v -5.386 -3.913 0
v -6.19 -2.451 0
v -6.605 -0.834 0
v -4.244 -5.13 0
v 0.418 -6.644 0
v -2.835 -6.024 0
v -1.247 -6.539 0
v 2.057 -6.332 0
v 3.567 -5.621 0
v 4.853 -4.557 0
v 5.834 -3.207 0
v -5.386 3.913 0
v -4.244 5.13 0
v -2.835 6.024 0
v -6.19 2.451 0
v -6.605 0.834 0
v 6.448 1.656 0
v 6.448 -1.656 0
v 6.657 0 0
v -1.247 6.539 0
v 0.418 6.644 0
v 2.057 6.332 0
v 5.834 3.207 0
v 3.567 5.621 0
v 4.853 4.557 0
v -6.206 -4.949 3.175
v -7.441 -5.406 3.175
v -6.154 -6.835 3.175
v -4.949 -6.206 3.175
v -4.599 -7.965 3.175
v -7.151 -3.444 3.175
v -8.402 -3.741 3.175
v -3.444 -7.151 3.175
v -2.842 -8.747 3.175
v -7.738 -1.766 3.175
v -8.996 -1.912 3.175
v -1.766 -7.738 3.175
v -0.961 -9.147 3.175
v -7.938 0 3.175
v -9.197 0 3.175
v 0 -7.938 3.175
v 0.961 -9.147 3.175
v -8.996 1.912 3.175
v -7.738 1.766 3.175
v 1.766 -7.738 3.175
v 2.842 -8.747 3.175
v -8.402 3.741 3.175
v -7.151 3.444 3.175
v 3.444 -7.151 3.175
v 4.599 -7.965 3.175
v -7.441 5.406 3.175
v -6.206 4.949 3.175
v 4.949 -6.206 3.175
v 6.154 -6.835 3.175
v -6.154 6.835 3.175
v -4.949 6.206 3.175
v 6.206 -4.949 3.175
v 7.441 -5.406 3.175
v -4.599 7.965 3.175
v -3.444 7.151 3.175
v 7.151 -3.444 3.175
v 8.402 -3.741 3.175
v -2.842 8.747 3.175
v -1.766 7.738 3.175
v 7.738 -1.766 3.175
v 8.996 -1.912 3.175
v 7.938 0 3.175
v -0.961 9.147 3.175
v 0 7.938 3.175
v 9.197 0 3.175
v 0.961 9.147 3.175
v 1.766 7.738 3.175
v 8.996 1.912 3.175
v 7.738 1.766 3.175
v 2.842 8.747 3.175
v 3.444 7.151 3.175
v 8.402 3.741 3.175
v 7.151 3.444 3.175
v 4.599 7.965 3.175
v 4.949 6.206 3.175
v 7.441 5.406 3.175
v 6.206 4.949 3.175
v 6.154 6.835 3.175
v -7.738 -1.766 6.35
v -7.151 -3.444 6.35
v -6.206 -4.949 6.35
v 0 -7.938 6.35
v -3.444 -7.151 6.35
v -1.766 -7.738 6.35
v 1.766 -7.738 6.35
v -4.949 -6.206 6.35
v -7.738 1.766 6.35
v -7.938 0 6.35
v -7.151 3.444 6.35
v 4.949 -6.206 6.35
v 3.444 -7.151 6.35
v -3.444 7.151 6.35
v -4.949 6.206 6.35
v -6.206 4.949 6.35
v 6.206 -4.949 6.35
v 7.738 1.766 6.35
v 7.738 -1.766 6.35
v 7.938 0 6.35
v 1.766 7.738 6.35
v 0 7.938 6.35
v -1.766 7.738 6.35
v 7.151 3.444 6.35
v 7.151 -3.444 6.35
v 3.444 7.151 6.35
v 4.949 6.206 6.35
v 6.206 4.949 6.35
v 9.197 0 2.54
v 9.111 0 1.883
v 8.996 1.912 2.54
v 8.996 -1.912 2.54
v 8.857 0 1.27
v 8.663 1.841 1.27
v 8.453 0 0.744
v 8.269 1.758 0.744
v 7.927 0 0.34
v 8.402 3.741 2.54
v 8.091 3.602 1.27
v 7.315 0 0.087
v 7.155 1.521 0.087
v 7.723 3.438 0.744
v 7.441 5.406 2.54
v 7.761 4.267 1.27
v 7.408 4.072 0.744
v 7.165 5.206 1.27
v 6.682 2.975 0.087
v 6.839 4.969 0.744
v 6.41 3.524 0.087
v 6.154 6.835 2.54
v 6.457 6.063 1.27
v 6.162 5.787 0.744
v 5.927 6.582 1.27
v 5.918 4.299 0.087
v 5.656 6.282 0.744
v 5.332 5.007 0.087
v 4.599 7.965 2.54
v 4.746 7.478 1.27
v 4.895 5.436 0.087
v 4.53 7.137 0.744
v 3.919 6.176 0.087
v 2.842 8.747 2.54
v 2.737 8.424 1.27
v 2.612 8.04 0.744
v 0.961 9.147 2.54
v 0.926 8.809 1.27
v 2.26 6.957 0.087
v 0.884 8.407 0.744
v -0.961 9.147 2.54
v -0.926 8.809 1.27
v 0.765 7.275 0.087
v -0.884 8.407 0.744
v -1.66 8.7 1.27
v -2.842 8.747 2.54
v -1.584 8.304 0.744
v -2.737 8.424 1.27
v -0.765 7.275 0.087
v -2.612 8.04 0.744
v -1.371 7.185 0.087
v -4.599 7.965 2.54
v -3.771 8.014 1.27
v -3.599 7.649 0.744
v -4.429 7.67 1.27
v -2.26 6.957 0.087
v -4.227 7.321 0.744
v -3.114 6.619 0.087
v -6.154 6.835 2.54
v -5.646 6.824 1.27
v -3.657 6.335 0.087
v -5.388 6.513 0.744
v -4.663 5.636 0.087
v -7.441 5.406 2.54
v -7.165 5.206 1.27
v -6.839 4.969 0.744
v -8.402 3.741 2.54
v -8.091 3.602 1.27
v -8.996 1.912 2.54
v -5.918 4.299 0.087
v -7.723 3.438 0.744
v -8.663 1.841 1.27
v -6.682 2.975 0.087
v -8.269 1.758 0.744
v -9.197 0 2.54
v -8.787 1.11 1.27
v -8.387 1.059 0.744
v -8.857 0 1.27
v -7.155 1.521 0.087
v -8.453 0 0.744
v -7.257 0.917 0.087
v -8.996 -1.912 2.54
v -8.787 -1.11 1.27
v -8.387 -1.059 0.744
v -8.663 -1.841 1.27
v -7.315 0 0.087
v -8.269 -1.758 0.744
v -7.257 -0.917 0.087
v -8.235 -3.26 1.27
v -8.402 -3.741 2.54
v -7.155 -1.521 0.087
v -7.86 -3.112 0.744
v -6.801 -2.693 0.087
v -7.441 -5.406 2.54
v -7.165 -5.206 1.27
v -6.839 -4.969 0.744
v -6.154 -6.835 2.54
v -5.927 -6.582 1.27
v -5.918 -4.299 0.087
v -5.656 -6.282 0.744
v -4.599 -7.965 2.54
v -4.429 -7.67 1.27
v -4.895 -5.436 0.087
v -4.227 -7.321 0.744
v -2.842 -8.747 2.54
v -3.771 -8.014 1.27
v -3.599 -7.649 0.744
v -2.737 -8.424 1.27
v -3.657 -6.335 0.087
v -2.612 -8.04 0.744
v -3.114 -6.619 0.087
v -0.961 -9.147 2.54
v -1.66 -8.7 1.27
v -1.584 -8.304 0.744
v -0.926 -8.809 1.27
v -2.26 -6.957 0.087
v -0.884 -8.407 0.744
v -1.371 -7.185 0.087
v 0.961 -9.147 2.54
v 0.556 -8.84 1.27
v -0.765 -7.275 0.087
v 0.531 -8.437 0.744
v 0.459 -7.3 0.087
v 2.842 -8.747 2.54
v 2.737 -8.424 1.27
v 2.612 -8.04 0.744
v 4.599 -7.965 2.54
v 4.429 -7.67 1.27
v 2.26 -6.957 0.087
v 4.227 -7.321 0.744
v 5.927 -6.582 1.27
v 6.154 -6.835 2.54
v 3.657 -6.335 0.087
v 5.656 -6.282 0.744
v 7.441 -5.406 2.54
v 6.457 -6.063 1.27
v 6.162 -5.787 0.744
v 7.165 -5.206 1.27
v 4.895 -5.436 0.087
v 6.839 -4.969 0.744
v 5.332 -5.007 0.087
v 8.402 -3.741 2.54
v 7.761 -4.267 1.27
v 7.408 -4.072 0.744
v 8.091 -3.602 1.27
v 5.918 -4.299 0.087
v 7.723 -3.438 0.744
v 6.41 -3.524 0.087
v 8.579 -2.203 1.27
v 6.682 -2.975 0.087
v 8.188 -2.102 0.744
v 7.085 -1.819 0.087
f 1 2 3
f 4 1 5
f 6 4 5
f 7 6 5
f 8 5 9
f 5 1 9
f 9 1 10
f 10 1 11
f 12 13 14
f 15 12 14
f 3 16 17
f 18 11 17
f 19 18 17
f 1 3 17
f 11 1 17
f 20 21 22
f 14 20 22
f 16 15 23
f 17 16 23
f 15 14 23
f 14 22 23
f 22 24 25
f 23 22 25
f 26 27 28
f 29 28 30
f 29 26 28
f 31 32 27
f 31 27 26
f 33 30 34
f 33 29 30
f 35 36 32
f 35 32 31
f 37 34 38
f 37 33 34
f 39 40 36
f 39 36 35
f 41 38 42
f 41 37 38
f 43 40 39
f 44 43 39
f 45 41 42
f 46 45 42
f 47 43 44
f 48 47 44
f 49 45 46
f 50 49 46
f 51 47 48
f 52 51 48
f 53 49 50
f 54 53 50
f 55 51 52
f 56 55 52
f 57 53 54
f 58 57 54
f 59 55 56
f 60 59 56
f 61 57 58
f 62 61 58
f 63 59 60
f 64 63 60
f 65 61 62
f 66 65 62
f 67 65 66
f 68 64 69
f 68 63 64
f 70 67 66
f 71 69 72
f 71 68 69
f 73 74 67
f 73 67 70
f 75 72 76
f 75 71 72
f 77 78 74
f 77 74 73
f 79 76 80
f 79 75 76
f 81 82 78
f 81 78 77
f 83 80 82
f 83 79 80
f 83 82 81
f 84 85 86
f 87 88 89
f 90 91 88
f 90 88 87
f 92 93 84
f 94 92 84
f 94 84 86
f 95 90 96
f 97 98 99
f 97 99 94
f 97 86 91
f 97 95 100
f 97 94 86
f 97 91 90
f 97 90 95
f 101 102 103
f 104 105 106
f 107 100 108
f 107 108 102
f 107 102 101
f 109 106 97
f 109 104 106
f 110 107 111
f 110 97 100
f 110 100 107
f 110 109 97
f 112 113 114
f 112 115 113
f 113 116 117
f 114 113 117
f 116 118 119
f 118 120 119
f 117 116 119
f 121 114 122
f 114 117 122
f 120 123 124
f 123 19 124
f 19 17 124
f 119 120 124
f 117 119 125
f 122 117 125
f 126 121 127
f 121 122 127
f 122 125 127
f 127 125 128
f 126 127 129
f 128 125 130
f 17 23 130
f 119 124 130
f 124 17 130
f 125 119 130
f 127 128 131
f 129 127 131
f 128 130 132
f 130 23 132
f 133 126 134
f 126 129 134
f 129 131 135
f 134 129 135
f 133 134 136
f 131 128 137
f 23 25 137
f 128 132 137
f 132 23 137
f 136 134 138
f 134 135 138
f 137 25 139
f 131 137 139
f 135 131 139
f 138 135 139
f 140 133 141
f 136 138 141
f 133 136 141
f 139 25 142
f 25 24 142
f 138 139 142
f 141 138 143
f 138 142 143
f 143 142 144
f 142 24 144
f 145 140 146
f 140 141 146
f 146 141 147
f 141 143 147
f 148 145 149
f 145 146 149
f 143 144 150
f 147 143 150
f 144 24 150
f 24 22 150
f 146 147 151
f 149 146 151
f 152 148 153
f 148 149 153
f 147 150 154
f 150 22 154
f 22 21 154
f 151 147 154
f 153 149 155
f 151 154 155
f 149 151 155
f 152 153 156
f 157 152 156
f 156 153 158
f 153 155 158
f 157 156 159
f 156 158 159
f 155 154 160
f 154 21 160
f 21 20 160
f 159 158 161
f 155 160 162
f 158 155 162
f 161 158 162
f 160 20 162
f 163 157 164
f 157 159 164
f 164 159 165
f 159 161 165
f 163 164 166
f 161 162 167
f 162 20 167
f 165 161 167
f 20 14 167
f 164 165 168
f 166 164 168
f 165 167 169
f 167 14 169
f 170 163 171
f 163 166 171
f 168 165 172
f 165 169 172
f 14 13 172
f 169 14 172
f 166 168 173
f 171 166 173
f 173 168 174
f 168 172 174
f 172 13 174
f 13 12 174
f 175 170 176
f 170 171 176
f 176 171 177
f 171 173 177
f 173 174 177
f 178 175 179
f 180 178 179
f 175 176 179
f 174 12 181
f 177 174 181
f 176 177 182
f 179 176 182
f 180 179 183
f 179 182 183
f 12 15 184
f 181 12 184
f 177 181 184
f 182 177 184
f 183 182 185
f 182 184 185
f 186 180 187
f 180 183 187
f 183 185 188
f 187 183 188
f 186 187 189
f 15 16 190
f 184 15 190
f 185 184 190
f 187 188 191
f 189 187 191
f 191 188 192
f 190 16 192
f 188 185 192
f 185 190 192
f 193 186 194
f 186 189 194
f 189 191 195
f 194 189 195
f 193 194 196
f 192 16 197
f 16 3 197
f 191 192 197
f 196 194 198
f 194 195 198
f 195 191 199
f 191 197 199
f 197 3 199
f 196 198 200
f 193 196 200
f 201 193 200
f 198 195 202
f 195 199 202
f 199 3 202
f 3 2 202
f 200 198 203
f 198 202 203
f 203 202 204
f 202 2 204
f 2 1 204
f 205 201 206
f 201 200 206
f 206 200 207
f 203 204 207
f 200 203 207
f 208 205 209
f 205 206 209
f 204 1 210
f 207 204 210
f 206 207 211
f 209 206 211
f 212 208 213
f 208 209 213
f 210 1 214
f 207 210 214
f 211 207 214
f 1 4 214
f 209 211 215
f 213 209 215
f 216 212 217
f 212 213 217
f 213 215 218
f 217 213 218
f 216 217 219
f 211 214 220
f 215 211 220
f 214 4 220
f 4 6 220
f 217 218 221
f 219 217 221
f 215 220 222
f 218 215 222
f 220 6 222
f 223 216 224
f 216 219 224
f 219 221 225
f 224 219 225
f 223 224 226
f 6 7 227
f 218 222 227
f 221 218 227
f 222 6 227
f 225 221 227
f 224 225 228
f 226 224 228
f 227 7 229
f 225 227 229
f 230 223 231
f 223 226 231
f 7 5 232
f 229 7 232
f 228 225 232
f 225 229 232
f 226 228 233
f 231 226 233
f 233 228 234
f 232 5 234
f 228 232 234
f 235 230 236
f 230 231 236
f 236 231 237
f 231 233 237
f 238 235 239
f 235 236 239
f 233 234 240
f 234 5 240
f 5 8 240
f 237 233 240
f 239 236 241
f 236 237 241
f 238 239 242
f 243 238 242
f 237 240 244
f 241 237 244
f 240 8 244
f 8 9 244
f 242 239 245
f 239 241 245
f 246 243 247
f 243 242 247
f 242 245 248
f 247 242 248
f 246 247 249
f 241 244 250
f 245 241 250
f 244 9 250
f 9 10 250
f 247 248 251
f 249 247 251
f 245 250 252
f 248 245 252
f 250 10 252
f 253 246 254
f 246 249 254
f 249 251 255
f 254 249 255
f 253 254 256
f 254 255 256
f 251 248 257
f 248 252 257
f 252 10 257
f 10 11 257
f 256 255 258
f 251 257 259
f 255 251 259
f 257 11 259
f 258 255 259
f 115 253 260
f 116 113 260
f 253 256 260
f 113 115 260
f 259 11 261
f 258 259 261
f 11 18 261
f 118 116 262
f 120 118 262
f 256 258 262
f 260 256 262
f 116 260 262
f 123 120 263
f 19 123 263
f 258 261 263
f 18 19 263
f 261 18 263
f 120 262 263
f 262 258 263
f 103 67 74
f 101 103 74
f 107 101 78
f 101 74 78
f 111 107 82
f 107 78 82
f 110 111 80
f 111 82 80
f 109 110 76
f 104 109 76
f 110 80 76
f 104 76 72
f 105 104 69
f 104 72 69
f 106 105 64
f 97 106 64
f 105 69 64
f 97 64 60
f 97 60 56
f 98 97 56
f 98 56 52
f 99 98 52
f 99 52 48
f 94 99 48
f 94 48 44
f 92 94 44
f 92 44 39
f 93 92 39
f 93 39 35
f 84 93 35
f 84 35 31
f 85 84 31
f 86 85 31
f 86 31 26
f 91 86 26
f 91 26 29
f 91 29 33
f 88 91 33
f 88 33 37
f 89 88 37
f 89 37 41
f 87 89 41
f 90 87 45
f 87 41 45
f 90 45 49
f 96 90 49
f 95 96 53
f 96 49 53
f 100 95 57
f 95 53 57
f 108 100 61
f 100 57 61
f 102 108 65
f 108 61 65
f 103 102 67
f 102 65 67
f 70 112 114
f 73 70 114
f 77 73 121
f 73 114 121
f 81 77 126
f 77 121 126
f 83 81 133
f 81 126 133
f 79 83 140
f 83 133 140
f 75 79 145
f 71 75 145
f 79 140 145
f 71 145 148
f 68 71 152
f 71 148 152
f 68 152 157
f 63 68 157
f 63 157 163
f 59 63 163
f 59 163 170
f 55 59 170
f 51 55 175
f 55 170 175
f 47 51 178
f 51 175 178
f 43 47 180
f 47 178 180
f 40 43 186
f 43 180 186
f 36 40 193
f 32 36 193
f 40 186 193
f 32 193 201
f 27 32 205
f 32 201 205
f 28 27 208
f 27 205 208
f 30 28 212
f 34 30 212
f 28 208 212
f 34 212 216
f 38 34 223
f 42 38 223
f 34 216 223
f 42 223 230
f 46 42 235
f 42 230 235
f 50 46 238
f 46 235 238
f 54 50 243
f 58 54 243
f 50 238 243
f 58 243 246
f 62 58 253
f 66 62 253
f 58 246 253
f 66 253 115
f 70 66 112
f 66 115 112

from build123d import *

# Parameters (mm, degrees)
F0_R     = 7.9375
F1_DEPTH = 6.35
F0_R_2   = 9.19734
F2_DEPTH = 3.175
F3_R     = 2.54


with BuildPart() as f1:
    # F0 (on Top) → F1 (new body)
    with BuildSketch(Plane.XY):
        Circle(F0_R)
    extrude(amount=F1_DEPTH)

    # F0 (on Top) → F2 (join)
    with BuildSketch(Plane.XY):
        Circle(F0_R_2)
        Circle(F0_R, mode=Mode.SUBTRACT)
    extrude(amount=F2_DEPTH)

    # F3
    f3_edges = [f1.edges().sort_by_distance(p)[0] for p in [
        (-9.19734, 0, 0),
    ]]
    fillet(f3_edges, radius=F3_R)


solid = f1.part
